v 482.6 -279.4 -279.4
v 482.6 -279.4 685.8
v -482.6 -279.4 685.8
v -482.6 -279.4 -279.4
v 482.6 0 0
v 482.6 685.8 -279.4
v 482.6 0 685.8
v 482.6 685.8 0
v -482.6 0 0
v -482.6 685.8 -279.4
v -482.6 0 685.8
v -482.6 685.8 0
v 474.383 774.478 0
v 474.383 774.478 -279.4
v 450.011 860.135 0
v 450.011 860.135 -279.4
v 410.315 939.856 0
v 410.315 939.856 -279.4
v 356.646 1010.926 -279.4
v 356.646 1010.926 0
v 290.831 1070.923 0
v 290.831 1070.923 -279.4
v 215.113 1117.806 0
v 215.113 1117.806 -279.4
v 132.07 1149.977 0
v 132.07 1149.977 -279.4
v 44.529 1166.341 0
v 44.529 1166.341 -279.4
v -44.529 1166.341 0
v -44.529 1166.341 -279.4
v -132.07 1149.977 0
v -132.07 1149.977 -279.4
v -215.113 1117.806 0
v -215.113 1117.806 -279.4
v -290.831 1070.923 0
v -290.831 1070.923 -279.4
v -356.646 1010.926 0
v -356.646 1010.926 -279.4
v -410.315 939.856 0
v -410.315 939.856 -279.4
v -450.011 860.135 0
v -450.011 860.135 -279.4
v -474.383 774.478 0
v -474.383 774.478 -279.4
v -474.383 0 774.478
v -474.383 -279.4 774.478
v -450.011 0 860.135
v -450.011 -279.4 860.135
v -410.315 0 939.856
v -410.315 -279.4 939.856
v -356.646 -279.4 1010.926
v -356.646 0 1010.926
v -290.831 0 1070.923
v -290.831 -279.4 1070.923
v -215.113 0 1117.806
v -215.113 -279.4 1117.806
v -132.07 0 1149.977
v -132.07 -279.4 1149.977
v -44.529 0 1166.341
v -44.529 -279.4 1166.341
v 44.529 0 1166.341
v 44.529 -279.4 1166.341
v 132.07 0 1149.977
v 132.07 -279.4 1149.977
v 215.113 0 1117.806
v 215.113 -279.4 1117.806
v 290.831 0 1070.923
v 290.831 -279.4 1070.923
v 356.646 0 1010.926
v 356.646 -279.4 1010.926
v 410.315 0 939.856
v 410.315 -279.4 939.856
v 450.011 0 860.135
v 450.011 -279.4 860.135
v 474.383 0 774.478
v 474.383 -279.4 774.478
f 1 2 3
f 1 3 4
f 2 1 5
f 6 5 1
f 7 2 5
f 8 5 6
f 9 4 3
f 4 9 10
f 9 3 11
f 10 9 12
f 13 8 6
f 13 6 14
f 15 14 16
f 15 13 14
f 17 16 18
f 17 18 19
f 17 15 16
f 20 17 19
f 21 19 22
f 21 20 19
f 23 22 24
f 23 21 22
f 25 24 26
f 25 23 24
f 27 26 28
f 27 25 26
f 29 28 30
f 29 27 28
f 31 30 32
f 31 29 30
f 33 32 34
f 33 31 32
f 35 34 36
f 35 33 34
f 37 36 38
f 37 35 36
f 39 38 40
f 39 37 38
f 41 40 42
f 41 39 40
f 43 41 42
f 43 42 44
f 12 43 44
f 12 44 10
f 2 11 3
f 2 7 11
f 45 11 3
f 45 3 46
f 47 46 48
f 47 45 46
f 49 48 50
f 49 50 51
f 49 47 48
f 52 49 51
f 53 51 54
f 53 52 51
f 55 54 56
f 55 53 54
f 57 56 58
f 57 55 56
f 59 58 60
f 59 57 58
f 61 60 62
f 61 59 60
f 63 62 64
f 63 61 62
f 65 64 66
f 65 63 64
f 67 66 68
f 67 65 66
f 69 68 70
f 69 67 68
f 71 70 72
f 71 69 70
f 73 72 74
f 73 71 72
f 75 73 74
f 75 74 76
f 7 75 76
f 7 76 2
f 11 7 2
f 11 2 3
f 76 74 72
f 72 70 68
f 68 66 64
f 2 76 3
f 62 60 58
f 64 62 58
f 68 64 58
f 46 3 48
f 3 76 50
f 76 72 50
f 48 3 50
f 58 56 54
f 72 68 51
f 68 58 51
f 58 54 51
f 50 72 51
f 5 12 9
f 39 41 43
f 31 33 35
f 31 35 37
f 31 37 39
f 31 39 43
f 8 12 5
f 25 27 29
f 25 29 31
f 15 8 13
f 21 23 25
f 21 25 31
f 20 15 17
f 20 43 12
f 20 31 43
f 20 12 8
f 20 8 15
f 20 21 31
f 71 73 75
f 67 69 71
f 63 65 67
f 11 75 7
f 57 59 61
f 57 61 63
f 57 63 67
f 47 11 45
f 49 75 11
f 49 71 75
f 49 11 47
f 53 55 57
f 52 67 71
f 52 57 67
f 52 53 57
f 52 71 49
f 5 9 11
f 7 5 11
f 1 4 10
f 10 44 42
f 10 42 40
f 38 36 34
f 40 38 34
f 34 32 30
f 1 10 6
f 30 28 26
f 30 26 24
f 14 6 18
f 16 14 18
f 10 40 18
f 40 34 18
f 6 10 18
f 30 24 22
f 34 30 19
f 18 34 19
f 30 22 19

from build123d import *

# Parameters (mm, degrees)
F1_DEPTH = 482.6
F4_DEPTH = 279.4
F5_DEPTH = 279.4


with BuildPart() as f1:
    # F0 (on Right) → F1 (new body, symmetric)
    with BuildSketch(Plane.YZ):
        Polygon((0, 685.8), (-279.4, 685.8), (-279.4, -279.4), (685.8, -279.4), (685.8, 0), (0, 0), align=None)
    extrude(amount=F1_DEPTH, both=True)

    # F3 (on face) → F4 (join)
    with BuildSketch(Plane.XY):
        with BuildLine():
            Line((-482.6, 685.8), (482.6, 685.8))
            ThreePointArc((482.6, 685.8), (0, 1168.4), (-482.6, 685.8))
        make_face()
    extrude(amount=-F4_DEPTH)


with BuildPart() as f5:
    # F2 (on face) → F5 (new body)
    with BuildSketch(Plane(origin=(0, 0, 0), x_dir=(-1, 0, 0), z_dir=(0, 1, 0))):
        with BuildLine():
            Line((-482.6, 685.8), (482.6, 685.8))
            ThreePointArc((482.6, 685.8), (0, 1168.4), (-482.6, 685.8))
        make_face()
    extrude(amount=-F5_DEPTH)


solid = Compound([f1.part, f5.part])
